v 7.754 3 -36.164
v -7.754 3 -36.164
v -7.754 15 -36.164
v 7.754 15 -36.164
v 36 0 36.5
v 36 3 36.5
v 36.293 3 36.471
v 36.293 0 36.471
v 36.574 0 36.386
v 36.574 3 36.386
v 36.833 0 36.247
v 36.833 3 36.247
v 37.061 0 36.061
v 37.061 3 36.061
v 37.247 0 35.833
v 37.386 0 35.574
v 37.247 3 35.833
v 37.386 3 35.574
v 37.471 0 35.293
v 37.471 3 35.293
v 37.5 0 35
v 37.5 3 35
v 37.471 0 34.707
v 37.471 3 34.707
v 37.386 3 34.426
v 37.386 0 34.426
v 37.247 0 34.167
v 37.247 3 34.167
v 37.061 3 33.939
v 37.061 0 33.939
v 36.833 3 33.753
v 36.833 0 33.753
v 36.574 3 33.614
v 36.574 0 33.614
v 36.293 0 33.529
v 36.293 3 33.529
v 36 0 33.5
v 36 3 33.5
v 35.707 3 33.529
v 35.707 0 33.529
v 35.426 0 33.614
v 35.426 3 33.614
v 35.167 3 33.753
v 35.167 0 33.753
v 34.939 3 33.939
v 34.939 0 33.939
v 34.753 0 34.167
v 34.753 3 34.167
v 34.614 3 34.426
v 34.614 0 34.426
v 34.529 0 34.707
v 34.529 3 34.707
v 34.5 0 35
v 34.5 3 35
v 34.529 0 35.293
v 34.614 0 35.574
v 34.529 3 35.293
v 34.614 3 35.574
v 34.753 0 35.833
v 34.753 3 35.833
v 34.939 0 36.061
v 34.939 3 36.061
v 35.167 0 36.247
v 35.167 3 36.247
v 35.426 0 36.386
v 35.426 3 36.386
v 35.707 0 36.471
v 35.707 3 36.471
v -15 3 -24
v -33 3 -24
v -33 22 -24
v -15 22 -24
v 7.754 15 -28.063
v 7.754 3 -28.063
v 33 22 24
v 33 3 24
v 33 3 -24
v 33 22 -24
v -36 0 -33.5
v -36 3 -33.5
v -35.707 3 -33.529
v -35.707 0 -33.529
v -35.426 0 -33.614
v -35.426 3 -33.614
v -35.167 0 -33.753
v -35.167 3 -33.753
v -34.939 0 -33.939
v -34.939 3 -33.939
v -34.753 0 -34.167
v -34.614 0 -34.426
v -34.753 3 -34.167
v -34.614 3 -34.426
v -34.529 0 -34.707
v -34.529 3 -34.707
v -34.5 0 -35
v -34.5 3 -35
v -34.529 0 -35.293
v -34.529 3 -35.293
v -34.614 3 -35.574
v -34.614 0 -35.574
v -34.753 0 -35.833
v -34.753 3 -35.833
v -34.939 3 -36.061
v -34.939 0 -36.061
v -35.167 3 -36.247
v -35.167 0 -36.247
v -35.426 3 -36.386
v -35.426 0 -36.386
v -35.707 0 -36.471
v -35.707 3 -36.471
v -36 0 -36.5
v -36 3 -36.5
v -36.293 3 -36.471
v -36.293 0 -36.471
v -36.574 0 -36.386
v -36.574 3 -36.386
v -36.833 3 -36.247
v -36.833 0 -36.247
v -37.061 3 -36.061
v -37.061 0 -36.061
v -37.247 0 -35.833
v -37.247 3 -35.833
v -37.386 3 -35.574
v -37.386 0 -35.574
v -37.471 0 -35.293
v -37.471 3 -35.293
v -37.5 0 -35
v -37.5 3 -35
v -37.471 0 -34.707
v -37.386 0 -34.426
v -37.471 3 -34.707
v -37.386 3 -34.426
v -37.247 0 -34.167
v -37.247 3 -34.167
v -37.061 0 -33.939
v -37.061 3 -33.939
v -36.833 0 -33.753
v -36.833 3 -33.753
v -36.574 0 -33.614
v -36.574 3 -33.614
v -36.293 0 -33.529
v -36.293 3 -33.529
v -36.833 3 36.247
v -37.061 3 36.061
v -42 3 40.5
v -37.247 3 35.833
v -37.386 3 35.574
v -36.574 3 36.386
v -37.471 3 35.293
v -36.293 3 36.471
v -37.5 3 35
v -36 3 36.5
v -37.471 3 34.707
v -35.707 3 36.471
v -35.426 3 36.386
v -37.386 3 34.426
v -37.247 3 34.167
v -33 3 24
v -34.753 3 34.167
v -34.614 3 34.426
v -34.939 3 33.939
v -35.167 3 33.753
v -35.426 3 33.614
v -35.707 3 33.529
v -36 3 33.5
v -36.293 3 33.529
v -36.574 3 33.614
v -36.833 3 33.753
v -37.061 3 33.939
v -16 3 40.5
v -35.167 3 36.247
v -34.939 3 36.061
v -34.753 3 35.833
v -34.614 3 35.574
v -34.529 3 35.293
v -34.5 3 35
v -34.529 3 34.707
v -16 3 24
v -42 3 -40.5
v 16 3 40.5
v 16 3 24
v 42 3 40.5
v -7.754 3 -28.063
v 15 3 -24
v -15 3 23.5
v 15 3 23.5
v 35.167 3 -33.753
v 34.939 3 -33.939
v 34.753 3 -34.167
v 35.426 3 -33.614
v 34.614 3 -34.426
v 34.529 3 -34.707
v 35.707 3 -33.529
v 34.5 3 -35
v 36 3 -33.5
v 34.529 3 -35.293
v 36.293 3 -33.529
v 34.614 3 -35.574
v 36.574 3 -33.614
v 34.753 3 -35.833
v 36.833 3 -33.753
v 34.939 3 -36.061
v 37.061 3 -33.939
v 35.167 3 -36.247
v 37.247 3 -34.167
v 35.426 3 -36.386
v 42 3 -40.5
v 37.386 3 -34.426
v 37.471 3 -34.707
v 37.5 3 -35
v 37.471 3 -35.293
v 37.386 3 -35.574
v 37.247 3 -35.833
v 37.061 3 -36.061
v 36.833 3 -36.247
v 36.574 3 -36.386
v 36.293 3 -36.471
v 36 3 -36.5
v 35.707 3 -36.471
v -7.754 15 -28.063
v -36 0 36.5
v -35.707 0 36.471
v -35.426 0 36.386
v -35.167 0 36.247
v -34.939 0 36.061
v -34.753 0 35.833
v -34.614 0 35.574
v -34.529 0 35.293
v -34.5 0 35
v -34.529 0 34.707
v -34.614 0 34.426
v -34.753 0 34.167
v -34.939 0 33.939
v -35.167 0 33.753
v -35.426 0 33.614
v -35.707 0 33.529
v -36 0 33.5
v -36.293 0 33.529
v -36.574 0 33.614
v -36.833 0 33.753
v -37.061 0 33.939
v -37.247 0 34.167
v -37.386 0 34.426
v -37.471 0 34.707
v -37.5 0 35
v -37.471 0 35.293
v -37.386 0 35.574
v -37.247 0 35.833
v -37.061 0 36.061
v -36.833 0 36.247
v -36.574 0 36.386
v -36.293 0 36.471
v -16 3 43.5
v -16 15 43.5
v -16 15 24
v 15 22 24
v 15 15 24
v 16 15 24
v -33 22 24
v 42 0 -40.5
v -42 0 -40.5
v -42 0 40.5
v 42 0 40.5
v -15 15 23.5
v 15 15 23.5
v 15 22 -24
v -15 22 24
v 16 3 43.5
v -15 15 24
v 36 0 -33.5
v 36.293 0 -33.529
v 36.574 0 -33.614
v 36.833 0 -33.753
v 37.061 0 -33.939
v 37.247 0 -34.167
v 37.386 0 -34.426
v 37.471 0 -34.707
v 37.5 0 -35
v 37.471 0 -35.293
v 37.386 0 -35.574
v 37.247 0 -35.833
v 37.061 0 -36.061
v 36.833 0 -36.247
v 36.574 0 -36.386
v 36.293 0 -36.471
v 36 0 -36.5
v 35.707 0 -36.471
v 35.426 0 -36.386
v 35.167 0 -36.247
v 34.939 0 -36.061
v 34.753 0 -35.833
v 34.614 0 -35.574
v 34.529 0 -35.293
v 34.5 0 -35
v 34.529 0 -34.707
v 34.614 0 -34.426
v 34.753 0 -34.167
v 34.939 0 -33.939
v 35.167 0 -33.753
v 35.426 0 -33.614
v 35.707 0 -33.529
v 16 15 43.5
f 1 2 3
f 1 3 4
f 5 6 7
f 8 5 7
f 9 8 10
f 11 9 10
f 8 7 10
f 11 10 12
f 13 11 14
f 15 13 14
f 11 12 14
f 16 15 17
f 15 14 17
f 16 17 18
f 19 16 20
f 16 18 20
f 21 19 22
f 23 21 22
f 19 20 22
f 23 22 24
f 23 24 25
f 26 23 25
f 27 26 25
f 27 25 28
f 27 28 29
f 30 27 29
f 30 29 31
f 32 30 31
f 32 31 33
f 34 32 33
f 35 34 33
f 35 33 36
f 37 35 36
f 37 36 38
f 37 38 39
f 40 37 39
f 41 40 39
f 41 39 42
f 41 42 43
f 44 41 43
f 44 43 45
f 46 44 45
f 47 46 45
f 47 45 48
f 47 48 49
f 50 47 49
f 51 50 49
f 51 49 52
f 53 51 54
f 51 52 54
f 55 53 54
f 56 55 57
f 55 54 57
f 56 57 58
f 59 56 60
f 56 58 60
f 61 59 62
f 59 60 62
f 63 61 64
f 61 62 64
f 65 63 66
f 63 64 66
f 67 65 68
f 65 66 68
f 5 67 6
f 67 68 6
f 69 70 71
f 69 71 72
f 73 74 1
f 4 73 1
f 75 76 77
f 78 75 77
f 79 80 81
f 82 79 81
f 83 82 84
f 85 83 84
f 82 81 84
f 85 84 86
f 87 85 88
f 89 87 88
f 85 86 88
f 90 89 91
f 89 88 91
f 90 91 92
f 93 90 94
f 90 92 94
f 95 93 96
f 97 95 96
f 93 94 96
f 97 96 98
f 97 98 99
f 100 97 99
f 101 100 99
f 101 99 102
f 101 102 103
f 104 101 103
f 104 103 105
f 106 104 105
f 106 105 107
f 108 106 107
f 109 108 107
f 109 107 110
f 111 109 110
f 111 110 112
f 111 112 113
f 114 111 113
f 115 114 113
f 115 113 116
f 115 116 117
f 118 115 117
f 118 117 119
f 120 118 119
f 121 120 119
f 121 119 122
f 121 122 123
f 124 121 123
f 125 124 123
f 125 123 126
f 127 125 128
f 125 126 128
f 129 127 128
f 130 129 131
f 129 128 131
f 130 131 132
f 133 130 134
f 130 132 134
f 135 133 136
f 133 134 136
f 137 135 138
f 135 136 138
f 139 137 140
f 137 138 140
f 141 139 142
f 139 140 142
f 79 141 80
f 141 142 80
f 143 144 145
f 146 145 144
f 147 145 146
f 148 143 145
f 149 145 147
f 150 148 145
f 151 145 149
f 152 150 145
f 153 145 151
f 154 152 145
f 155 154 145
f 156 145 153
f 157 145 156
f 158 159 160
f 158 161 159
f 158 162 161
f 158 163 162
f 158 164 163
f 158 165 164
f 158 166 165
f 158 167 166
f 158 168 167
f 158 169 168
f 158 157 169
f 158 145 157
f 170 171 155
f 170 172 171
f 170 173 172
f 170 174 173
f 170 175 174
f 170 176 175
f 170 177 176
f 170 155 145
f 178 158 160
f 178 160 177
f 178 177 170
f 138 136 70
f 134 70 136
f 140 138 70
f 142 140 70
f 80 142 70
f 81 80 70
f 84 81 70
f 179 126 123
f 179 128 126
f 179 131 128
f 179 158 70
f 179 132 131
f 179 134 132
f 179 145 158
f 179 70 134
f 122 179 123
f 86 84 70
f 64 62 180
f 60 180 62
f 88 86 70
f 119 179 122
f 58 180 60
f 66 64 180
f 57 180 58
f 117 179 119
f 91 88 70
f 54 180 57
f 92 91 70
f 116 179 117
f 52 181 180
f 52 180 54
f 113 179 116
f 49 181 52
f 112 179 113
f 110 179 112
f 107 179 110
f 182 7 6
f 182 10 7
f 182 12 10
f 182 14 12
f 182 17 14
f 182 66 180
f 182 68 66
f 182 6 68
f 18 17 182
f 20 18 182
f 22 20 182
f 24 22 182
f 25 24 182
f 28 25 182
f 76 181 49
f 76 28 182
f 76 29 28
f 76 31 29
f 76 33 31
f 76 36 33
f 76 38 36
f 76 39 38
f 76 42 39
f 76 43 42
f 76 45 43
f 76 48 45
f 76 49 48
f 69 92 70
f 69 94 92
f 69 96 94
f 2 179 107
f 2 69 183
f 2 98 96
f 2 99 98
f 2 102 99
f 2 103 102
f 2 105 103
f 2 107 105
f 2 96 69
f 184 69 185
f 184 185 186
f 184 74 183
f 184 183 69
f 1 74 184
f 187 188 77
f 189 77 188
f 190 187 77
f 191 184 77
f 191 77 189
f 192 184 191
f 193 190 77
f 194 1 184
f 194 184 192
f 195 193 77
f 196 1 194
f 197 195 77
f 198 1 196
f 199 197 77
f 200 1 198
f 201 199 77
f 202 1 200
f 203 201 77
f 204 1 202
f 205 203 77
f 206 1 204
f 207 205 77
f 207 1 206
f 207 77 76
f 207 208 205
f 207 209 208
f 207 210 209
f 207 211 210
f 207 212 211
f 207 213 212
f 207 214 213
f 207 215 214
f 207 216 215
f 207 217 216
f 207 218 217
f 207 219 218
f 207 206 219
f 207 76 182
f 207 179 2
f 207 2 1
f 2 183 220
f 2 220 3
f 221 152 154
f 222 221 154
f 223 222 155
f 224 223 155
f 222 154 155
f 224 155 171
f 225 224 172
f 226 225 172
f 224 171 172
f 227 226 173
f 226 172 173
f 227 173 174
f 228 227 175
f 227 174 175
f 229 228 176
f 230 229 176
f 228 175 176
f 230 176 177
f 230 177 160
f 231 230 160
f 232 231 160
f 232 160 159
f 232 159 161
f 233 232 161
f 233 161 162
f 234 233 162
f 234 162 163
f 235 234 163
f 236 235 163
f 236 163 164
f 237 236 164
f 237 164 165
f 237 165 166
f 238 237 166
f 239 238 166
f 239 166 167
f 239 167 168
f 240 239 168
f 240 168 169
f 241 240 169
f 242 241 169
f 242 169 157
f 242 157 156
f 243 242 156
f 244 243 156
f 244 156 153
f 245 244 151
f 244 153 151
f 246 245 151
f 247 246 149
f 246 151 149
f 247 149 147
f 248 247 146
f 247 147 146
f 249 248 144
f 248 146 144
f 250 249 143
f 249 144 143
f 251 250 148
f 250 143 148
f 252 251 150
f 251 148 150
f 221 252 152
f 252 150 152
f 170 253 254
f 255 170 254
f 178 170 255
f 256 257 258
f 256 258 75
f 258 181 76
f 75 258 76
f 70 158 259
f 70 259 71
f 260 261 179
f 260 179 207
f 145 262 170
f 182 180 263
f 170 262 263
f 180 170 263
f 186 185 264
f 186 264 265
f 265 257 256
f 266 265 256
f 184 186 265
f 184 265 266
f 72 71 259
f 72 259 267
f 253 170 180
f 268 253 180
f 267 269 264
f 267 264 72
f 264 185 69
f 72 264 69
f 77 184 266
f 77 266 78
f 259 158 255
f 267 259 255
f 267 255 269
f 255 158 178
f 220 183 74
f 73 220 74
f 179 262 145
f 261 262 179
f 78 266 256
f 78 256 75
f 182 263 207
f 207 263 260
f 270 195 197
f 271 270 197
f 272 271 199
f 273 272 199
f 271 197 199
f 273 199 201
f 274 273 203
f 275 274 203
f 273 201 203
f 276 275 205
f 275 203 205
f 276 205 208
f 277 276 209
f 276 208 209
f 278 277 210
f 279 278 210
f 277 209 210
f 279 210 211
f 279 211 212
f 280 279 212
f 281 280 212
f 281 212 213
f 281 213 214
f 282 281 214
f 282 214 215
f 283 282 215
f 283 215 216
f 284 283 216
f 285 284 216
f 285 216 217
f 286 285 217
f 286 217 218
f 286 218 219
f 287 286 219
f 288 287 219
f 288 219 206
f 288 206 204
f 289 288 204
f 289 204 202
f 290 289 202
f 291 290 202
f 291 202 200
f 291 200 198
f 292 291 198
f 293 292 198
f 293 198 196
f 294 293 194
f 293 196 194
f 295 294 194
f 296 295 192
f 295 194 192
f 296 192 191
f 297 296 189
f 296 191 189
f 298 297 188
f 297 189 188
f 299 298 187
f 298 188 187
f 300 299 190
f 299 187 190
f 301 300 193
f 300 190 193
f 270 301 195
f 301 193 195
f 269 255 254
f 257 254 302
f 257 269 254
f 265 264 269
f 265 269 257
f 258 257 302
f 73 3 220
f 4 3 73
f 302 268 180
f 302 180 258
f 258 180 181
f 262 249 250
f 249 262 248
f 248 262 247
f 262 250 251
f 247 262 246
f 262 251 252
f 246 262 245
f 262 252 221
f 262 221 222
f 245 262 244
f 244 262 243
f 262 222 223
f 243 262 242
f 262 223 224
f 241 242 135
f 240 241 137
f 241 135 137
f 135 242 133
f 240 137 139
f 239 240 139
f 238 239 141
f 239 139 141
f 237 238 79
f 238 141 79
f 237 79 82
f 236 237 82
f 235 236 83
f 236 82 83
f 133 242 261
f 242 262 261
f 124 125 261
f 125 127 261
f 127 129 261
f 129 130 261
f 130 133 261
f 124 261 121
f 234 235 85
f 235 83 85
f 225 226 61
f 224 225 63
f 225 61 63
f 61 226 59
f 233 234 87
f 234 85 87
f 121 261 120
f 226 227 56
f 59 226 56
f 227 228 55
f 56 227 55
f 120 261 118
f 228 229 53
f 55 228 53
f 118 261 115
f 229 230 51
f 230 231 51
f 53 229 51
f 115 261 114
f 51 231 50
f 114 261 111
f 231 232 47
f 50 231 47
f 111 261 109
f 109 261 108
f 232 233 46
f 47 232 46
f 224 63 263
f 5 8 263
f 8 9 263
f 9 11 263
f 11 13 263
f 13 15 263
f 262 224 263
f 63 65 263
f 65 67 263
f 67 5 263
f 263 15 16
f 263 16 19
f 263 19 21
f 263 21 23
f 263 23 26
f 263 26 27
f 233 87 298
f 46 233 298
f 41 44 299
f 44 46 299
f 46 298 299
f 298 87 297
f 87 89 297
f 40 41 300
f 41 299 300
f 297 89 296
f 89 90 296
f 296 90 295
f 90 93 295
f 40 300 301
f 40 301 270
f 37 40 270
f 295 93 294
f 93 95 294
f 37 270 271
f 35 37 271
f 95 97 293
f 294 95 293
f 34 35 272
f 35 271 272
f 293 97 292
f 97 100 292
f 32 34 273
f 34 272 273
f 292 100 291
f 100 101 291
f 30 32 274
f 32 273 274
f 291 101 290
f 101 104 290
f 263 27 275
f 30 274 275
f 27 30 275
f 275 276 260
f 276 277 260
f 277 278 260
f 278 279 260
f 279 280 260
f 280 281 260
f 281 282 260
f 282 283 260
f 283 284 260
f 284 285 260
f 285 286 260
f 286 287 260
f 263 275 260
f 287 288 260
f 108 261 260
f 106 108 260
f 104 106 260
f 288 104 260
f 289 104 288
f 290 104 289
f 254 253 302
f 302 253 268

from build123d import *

# Parameters (mm, degrees)
SKETCH1_W           = 84
SKETCH1_H           = 81
BOSS_EXTRUDE1_DEPTH = 3
SKETCH2_W           = 18
SKETCH2_H           = 48
BOSS_EXTRUDE2_DEPTH = 19
SKETCH3_W           = 32
SKETCH3_H           = 20
SKETCH3_W_2         = 15.507070526
SKETCH3_H_2         = 8.100708483
BOSS_EXTRUDE3_DEPTH = 12
SKETCH4_R           = 1.5
CUT_EXTRUDE1_DEPTH  = 12


with BuildPart() as part:
    # Sketch1 → Boss-Extrude1 (new body)
    with BuildSketch(Plane(origin=(0, 0, 0), x_dir=(1, 0, 0), z_dir=(0, 1, 0))):
        Rectangle(SKETCH1_W, SKETCH1_H)
    extrude(amount=BOSS_EXTRUDE1_DEPTH)

    # Sketch2 → Boss-Extrude2 (add)
    with BuildSketch(Plane(origin=(0, 3, 0), x_dir=(1, 0, 0), z_dir=(0, 1, 0))):
        with Locations((-24, 0)):
            Rectangle(SKETCH2_W, SKETCH2_H)
        with Locations((24, 0)):
            Rectangle(SKETCH2_W, SKETCH2_H)
    extrude(amount=BOSS_EXTRUDE2_DEPTH)

    # Sketch3 → Boss-Extrude3 (add)
    with BuildSketch(Plane(origin=(0, 3, 0), x_dir=(1, 0, 0), z_dir=(0, 1, 0))):
        with Locations((0, -33.5)):
            Rectangle(SKETCH3_W, SKETCH3_H)
        with Locations((0, 32.113522915)):
            Rectangle(SKETCH3_W_2, SKETCH3_H_2)
    extrude(amount=BOSS_EXTRUDE3_DEPTH)

    # Sketch4 → Cut-Extrude1 (cut)
    with BuildSketch(Plane(origin=(0, 3, 0), x_dir=(1, 0, 0), z_dir=(0, 1, 0))):
        with Locations(Location((-36, 35, 0), (0, 0, 270))):
            Circle(SKETCH4_R)
        with Locations(Location((36, 35, 0), (0, 0, 270))):
            Circle(SKETCH4_R)
        with Locations(Location((36, -35, 0), (0, 0, 270))):
            Circle(SKETCH4_R)
        with Locations(Location((-36, -35, 0), (0, 0, 270))):
            Circle(SKETCH4_R)
    extrude(amount=-CUT_EXTRUDE1_DEPTH, mode=Mode.SUBTRACT)


solid = part.part
